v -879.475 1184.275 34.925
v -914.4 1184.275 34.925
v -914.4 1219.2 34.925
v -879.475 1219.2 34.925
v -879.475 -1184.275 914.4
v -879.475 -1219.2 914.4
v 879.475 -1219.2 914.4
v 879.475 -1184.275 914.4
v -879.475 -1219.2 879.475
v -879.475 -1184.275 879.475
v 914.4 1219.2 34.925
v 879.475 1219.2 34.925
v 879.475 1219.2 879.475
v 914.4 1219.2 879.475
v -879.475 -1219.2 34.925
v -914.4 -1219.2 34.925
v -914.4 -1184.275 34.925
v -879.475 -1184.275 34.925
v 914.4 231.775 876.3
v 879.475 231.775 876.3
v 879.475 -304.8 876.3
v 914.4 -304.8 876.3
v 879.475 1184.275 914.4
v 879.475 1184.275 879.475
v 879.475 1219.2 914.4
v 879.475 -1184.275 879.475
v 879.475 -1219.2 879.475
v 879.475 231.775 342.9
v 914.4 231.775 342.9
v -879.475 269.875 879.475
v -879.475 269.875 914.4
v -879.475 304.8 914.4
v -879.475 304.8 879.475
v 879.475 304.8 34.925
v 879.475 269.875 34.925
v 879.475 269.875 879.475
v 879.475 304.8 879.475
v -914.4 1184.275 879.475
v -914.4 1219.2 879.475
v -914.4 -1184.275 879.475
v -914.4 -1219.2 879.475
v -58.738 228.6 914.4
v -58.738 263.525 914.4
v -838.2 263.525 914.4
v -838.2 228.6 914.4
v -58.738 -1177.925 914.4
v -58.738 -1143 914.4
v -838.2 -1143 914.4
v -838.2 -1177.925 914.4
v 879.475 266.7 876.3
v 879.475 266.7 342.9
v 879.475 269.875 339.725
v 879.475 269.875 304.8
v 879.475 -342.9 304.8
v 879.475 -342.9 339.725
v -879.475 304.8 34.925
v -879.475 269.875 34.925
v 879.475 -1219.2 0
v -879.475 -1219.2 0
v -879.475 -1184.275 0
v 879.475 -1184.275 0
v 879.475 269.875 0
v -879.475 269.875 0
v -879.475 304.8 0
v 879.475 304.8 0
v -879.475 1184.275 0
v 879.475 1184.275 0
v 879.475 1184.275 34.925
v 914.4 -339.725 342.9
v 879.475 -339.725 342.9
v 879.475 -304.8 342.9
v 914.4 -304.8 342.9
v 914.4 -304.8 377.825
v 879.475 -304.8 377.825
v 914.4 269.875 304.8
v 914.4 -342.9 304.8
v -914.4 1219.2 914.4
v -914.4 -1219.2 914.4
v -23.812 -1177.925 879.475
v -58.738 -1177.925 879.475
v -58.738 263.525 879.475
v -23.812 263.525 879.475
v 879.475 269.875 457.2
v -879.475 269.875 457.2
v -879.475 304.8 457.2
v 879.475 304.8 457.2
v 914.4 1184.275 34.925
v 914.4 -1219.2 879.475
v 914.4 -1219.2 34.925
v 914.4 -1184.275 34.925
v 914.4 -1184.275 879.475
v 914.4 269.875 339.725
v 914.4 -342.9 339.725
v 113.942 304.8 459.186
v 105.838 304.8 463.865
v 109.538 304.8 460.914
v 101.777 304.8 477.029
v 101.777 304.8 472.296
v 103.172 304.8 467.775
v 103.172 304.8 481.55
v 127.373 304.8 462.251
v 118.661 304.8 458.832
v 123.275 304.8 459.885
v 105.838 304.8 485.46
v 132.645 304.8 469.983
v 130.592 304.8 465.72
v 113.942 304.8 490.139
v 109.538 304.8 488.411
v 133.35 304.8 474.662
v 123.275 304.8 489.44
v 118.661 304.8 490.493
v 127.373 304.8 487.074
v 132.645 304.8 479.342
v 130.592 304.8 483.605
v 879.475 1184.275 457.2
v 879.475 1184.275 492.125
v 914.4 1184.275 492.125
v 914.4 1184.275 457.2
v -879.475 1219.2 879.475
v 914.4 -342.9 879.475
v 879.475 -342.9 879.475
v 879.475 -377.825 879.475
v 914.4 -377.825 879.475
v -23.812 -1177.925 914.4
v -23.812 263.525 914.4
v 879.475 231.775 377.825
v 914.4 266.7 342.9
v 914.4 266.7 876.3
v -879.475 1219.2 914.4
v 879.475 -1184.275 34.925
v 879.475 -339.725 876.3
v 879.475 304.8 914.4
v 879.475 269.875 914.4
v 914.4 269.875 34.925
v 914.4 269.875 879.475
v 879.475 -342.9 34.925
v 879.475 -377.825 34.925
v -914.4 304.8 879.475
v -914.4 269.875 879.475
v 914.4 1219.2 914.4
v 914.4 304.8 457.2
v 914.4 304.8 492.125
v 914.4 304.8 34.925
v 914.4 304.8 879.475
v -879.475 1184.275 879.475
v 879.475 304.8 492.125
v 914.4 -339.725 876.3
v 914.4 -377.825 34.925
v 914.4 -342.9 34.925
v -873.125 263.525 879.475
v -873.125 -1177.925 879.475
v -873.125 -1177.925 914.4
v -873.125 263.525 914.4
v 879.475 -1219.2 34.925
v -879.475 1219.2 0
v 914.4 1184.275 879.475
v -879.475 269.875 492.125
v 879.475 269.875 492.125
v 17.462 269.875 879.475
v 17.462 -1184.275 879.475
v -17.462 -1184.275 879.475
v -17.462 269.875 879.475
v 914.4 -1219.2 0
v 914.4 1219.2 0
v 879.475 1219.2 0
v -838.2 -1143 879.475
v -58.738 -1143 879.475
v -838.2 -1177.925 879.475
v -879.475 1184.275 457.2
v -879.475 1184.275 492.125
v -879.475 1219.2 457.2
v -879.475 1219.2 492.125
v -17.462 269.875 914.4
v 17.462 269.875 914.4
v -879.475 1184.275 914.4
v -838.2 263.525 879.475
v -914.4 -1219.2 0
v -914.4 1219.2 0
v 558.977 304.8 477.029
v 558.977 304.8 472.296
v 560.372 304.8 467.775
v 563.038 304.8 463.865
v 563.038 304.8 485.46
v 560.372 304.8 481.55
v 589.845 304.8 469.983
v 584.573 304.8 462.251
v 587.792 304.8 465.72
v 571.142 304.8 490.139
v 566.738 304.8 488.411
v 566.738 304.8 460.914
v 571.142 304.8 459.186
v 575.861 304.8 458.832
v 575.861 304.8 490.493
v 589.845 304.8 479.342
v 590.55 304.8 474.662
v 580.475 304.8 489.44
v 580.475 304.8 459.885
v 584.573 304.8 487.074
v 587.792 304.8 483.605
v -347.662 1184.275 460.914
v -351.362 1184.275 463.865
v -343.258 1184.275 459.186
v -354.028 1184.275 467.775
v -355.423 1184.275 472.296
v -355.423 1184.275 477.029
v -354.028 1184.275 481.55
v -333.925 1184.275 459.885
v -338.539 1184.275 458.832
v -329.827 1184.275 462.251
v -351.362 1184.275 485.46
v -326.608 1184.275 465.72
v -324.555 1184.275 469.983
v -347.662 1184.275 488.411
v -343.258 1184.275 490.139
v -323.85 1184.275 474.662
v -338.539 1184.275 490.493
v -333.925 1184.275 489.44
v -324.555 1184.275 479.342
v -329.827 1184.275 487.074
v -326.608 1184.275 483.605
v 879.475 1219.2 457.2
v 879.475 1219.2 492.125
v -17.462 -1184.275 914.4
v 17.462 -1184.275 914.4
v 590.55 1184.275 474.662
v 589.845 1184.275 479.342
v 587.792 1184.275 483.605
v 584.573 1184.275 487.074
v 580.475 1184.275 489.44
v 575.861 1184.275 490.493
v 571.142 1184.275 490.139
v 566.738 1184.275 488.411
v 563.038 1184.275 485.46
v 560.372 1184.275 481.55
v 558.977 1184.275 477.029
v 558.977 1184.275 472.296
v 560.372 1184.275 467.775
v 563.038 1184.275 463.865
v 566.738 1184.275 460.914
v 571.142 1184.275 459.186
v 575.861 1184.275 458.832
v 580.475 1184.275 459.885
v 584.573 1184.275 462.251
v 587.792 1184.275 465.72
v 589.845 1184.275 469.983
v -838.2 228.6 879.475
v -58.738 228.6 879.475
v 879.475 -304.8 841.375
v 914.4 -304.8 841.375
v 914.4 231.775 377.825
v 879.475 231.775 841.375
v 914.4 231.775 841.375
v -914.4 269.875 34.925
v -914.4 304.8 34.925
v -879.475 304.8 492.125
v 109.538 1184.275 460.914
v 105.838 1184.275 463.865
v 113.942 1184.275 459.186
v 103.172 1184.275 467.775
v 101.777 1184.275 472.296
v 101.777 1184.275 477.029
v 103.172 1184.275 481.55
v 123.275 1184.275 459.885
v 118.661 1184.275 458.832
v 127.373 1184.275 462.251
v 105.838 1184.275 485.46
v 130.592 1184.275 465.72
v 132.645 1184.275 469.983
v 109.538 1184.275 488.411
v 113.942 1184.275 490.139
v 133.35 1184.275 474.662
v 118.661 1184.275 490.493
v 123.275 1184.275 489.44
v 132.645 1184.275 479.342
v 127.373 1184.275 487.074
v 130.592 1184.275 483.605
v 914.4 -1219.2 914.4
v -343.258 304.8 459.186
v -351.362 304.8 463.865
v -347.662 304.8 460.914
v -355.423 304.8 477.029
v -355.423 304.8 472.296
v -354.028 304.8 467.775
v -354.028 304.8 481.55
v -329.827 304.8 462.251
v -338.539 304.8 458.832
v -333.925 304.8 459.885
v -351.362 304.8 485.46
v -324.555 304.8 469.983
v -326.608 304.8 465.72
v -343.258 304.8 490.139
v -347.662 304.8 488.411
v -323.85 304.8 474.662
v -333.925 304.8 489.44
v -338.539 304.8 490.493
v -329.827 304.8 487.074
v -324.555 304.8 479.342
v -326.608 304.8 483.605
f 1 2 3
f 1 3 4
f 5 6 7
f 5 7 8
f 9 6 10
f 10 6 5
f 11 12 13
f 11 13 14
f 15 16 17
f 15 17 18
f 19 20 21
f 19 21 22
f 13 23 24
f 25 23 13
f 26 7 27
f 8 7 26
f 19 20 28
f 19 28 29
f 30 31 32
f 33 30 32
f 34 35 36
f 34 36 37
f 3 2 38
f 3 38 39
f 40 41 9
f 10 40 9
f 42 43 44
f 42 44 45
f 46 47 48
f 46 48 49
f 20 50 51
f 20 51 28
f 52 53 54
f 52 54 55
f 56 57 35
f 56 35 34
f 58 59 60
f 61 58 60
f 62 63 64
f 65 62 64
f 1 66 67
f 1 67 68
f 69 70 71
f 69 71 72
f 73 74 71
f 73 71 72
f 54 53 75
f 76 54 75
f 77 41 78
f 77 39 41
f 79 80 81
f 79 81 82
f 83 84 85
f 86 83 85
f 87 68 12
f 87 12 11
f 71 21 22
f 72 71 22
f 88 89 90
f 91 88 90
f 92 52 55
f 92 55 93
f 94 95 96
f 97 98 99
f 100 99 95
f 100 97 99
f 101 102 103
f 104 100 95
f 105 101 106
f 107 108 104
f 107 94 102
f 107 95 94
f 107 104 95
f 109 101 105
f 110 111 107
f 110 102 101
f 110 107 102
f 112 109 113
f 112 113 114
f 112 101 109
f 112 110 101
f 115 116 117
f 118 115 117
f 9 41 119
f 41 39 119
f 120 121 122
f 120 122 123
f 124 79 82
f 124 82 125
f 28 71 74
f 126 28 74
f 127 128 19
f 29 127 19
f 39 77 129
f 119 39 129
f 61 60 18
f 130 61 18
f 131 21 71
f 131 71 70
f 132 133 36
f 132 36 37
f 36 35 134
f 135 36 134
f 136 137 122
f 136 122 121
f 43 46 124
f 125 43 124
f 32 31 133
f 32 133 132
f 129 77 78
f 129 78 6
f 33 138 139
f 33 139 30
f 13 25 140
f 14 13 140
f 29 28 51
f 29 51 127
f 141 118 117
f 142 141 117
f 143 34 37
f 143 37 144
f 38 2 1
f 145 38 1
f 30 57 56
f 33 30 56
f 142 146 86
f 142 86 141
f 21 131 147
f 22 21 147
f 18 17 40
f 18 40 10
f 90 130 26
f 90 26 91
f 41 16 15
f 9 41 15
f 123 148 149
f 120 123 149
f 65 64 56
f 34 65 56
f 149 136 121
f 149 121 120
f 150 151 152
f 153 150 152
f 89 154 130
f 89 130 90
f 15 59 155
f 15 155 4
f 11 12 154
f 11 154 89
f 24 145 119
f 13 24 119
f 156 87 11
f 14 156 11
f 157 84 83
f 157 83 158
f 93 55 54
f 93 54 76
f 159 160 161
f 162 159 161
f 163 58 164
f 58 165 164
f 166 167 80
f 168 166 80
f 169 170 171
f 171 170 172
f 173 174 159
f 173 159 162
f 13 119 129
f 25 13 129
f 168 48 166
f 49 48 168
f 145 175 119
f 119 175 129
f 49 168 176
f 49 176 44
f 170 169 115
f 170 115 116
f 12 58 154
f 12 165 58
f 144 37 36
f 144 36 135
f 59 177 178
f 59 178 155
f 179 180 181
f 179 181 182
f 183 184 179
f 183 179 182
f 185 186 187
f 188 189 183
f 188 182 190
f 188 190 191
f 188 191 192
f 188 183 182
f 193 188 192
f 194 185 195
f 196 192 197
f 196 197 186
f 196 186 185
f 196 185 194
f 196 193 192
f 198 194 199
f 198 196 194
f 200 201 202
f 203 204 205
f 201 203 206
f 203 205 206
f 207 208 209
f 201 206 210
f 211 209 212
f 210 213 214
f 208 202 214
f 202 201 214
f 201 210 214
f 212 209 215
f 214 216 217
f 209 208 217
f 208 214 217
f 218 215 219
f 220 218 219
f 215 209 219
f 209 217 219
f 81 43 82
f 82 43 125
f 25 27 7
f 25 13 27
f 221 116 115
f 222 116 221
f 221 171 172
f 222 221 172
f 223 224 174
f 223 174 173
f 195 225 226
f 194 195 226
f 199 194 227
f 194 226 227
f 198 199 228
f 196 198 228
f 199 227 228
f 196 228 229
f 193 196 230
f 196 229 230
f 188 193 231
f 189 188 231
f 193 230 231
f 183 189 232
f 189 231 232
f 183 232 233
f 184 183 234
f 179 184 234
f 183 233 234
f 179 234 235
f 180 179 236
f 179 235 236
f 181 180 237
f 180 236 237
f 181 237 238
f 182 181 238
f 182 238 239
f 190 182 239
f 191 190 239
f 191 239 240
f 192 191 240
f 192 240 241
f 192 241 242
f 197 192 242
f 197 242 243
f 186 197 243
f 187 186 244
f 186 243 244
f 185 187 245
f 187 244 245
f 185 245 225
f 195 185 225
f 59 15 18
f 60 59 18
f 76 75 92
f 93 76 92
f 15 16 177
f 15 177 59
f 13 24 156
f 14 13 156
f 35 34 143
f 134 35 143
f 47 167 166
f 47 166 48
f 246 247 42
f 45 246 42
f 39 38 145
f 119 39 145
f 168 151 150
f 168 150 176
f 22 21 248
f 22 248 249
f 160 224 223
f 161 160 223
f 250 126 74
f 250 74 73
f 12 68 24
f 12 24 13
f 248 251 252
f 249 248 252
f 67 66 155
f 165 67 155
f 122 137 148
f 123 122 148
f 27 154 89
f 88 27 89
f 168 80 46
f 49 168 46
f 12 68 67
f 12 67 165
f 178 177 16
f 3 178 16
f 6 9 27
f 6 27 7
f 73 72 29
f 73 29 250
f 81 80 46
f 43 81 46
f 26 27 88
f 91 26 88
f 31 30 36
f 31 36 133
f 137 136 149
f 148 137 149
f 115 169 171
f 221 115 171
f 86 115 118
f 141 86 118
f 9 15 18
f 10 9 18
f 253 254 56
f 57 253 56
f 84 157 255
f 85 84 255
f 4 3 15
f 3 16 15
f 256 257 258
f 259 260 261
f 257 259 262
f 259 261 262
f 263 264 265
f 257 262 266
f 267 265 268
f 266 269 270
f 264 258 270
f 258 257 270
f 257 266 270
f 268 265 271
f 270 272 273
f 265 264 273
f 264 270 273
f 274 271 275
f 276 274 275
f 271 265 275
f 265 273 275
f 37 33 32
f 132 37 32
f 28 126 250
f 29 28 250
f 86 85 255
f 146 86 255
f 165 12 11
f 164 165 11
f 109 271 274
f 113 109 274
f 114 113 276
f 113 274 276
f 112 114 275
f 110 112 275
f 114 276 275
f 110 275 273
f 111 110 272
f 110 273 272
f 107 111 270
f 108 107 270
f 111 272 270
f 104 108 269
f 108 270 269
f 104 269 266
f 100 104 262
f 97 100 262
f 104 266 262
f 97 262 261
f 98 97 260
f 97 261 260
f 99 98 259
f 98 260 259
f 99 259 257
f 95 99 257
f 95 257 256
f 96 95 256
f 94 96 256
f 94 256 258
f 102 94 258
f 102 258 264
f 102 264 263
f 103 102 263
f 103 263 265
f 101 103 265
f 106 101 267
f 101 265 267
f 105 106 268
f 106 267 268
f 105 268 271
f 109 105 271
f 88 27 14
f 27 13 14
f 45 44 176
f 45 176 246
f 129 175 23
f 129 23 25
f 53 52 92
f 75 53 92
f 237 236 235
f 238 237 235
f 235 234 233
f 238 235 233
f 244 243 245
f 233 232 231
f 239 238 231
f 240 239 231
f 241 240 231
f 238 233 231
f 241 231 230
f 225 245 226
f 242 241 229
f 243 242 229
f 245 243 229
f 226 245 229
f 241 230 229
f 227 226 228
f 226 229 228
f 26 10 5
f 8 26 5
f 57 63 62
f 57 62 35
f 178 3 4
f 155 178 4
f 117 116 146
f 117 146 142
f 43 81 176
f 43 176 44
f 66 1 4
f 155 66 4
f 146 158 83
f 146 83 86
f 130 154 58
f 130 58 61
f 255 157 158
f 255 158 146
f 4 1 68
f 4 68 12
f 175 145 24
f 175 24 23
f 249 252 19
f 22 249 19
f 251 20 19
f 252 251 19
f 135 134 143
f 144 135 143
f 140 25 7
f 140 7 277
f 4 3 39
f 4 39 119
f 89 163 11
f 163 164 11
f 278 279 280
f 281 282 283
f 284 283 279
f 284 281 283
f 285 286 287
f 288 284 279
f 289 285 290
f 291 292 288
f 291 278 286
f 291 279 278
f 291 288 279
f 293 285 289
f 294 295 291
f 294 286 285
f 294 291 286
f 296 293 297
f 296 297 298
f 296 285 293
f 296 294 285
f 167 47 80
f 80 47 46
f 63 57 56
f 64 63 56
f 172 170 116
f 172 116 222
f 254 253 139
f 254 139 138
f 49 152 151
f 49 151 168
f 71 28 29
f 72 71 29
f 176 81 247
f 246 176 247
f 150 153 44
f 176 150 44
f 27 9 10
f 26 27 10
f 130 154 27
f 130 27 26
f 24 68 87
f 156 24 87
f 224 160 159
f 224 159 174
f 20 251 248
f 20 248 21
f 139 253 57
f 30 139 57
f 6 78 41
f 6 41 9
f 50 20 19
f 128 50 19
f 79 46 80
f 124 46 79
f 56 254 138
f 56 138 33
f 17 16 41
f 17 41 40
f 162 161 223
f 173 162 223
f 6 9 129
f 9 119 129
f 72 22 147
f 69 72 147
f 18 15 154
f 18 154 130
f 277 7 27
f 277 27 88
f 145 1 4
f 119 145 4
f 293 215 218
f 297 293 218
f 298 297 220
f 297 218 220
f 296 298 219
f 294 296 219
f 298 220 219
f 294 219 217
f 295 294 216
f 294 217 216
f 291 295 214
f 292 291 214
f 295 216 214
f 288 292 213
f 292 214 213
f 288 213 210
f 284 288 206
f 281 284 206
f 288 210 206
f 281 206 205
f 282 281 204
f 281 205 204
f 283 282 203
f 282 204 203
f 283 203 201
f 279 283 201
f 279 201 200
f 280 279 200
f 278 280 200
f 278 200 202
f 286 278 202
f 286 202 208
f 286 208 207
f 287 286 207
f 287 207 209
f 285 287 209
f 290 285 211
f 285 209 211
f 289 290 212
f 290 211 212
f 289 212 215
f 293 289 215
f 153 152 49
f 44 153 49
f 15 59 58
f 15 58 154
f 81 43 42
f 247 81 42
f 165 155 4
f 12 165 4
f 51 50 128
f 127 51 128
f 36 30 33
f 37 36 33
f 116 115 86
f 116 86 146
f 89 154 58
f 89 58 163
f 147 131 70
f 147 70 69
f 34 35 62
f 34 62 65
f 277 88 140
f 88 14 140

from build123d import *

# Parameters (mm, degrees)
F2_W      = 34.925
F2_H      = 34.925
F3_DEPTH  = 1219.2
F4_W      = 34.925
F4_H      = 34.925
F5_DEPTH  = 844.55
F6_W      = 34.925
F6_H      = 34.925
F7_DEPTH  = 1758.95
F8_R      = 15.875
F9_DEPTH  = 879.475
F10_W     = 34.925
F10_H     = 34.925
F11_DEPTH = 879.475
F12_W     = 34.925
F12_H     = 34.925
F13_DEPTH = 1454.15
F16_W     = 34.925
F16_H     = 34.925
F17_DEPTH = 1441.45
F18_W     = 34.925
F18_H     = 34.925
F19_DEPTH = 779.4625
F20_W     = 34.925
F20_H     = 34.925
F21_DEPTH = 844.55
F22_W     = 34.925
F22_H     = 34.925
F23_DEPTH = 612.775
F26_W     = 34.925
F26_H     = 34.925
F27_DEPTH = 533.4
F28_W     = 34.925
F28_H     = 34.925
F29_DEPTH = 536.575


with BuildPart() as f3:
    # F2 (on Front) → F3 (new body, symmetric)
    with BuildSketch(Plane.XZ):
        with Locations((896.9375, 17.4625)):
            Rectangle(F2_W, F2_H)
        with Locations((896.9375, 896.9375)):
            Rectangle(F2_W, F2_H)
        with Locations((-896.9375, 896.9375)):
            Rectangle(F2_W, F2_H)
        with Locations((-896.9375, 17.4625)):
            Rectangle(F2_W, F2_H)
    extrude(amount=F3_DEPTH, both=True)


with BuildPart() as f5:
    # F4 (on face) → F5 (new body, through all)
    with BuildSketch(Plane.XY.offset(34.925)):
        with Locations((-896.9375, -1201.7375)):
            Rectangle(F4_W, F4_H)
        with Locations((-896.9375, 1201.7375)):
            Rectangle(F4_W, F4_H)
        with Locations((896.9375, 1201.7375)):
            Rectangle(F4_W, F4_H)
        with Locations((896.9375, -1201.7375)):
            Rectangle(F4_W, F4_H)
        with Locations((-896.9375, 287.3375)):
            Rectangle(F4_W, F4_H)
        with Locations((896.9375, 287.3375)):
            Rectangle(F4_W, F4_H)
    extrude(amount=F5_DEPTH)


with BuildPart() as f7:
    # F6 (on face) → F7 (new body, through all)
    with BuildSketch(Plane.YZ.offset(-879.475)):
        with Locations((287.3375, 896.9375)):
            Rectangle(F6_W, F6_H)
        with Locations((-1201.7375, 896.9375)):
            Rectangle(F6_W, F6_H)
        with Locations((1201.7375, 896.9375)):
            Rectangle(F6_W, F6_H)
        with Locations((1201.7375, 17.4625)):
            Rectangle(F6_W, F6_H)
        with Locations((-1201.7375, 17.4625)):
            Rectangle(F6_W, F6_H)
        with Locations((287.3375, 17.4625)):
            Rectangle(F6_W, F6_H)
        with Locations((287.3375, 474.6625)):
            Rectangle(F6_W, F6_H)
        with Locations((1201.7375, 474.6625)):
            Rectangle(F6_W, F6_H)
    extrude(amount=F7_DEPTH)


with BuildPart() as f9:
    # F8 (on face) → F9 (new body, through all)
    with BuildSketch(Plane.XZ.offset(-1184.275)):
        with Locations((574.675, 474.6625)):
            Circle(F8_R)
        with Locations((117.475, 474.6625)):
            Circle(F8_R)
        with Locations((-339.725, 474.6625)):
            Circle(F8_R)
    extrude(amount=F9_DEPTH)


with BuildPart() as f11:
    # F10 (on face) → F11 (new body, through all)
    with BuildSketch(Plane.XZ.offset(-1184.275)):
        with Locations((896.9375, 474.6625)):
            Rectangle(F10_W, F10_H)
    extrude(amount=F11_DEPTH)


with BuildPart() as f13:
    # F12 (on face) → F13 (new body, through all)
    with BuildSketch(Plane(origin=(0, -1184.275, 0), x_dir=(-1, 0, 0), z_dir=(0, 1, 0))):
        with Locations((0, 896.9375)):
            Rectangle(F12_W, F12_H)
    extrude(amount=F13_DEPTH)


with BuildPart() as f17:
    # F16 (on face) → F17 (new body)
    with BuildSketch(Plane.XZ.offset(-263.525)):
        with Locations((-41.275, 896.9375)):
            Rectangle(F16_W, F16_H)
        with Locations((-855.6625, 896.9375)):
            Rectangle(F16_W, F16_H)
    extrude(amount=F17_DEPTH)


with BuildPart() as f19:
    # F18 (on face) → F19 (new body, through all)
    with BuildSketch(Plane(origin=(-58.7375, 0, 0), x_dir=(0, -1, 0), z_dir=(-1, 0, 0))):
        with Locations((-246.0625, 896.9375)):
            Rectangle(F18_W, F18_H)
        with Locations((1160.4625, 896.9375)):
            Rectangle(F18_W, F18_H)
    extrude(amount=F19_DEPTH)


with BuildPart() as f21:
    # F20 (on face) → F21 (new body, through all)
    with BuildSketch(Plane.XY.offset(34.925)):
        with Locations((896.9375, -360.3625)):
            Rectangle(F20_W, F20_H)
    extrude(amount=F21_DEPTH)


with BuildPart() as f23:
    # F22 (on face) → F23 (new body, through all)
    with BuildSketch(Plane.XZ.offset(-269.875)):
        with Locations((896.9375, 322.2625)):
            Rectangle(F22_W, F22_H)
    extrude(amount=F23_DEPTH)


with BuildPart() as f27:
    # F26 (on face) → F27 (new body)
    with BuildSketch(Plane(origin=(0, 0, 876.3), x_dir=(1, 0, 0), z_dir=(0, 0, -1))):
        with Locations((896.9375, 322.2625)):
            Rectangle(F26_W, F26_H)
        with Locations((896.9375, -249.2375)):
            Rectangle(F26_W, F26_H)
    extrude(amount=F27_DEPTH)


with BuildPart() as f29:
    # F28 (on face) → F29 (new body, through all)
    with BuildSketch(Plane.XZ.offset(-231.775)):
        with Locations((896.9375, 858.8375)):
            Rectangle(F28_W, F28_H)
        with Locations((896.9375, 360.3625)):
            Rectangle(F28_W, F28_H)
    extrude(amount=F29_DEPTH)


solid = Compound([f3.part, f5.part, f7.part, f9.part, f11.part, f13.part, f17.part, f19.part, f21.part, f23.part, f27.part, f29.part])
